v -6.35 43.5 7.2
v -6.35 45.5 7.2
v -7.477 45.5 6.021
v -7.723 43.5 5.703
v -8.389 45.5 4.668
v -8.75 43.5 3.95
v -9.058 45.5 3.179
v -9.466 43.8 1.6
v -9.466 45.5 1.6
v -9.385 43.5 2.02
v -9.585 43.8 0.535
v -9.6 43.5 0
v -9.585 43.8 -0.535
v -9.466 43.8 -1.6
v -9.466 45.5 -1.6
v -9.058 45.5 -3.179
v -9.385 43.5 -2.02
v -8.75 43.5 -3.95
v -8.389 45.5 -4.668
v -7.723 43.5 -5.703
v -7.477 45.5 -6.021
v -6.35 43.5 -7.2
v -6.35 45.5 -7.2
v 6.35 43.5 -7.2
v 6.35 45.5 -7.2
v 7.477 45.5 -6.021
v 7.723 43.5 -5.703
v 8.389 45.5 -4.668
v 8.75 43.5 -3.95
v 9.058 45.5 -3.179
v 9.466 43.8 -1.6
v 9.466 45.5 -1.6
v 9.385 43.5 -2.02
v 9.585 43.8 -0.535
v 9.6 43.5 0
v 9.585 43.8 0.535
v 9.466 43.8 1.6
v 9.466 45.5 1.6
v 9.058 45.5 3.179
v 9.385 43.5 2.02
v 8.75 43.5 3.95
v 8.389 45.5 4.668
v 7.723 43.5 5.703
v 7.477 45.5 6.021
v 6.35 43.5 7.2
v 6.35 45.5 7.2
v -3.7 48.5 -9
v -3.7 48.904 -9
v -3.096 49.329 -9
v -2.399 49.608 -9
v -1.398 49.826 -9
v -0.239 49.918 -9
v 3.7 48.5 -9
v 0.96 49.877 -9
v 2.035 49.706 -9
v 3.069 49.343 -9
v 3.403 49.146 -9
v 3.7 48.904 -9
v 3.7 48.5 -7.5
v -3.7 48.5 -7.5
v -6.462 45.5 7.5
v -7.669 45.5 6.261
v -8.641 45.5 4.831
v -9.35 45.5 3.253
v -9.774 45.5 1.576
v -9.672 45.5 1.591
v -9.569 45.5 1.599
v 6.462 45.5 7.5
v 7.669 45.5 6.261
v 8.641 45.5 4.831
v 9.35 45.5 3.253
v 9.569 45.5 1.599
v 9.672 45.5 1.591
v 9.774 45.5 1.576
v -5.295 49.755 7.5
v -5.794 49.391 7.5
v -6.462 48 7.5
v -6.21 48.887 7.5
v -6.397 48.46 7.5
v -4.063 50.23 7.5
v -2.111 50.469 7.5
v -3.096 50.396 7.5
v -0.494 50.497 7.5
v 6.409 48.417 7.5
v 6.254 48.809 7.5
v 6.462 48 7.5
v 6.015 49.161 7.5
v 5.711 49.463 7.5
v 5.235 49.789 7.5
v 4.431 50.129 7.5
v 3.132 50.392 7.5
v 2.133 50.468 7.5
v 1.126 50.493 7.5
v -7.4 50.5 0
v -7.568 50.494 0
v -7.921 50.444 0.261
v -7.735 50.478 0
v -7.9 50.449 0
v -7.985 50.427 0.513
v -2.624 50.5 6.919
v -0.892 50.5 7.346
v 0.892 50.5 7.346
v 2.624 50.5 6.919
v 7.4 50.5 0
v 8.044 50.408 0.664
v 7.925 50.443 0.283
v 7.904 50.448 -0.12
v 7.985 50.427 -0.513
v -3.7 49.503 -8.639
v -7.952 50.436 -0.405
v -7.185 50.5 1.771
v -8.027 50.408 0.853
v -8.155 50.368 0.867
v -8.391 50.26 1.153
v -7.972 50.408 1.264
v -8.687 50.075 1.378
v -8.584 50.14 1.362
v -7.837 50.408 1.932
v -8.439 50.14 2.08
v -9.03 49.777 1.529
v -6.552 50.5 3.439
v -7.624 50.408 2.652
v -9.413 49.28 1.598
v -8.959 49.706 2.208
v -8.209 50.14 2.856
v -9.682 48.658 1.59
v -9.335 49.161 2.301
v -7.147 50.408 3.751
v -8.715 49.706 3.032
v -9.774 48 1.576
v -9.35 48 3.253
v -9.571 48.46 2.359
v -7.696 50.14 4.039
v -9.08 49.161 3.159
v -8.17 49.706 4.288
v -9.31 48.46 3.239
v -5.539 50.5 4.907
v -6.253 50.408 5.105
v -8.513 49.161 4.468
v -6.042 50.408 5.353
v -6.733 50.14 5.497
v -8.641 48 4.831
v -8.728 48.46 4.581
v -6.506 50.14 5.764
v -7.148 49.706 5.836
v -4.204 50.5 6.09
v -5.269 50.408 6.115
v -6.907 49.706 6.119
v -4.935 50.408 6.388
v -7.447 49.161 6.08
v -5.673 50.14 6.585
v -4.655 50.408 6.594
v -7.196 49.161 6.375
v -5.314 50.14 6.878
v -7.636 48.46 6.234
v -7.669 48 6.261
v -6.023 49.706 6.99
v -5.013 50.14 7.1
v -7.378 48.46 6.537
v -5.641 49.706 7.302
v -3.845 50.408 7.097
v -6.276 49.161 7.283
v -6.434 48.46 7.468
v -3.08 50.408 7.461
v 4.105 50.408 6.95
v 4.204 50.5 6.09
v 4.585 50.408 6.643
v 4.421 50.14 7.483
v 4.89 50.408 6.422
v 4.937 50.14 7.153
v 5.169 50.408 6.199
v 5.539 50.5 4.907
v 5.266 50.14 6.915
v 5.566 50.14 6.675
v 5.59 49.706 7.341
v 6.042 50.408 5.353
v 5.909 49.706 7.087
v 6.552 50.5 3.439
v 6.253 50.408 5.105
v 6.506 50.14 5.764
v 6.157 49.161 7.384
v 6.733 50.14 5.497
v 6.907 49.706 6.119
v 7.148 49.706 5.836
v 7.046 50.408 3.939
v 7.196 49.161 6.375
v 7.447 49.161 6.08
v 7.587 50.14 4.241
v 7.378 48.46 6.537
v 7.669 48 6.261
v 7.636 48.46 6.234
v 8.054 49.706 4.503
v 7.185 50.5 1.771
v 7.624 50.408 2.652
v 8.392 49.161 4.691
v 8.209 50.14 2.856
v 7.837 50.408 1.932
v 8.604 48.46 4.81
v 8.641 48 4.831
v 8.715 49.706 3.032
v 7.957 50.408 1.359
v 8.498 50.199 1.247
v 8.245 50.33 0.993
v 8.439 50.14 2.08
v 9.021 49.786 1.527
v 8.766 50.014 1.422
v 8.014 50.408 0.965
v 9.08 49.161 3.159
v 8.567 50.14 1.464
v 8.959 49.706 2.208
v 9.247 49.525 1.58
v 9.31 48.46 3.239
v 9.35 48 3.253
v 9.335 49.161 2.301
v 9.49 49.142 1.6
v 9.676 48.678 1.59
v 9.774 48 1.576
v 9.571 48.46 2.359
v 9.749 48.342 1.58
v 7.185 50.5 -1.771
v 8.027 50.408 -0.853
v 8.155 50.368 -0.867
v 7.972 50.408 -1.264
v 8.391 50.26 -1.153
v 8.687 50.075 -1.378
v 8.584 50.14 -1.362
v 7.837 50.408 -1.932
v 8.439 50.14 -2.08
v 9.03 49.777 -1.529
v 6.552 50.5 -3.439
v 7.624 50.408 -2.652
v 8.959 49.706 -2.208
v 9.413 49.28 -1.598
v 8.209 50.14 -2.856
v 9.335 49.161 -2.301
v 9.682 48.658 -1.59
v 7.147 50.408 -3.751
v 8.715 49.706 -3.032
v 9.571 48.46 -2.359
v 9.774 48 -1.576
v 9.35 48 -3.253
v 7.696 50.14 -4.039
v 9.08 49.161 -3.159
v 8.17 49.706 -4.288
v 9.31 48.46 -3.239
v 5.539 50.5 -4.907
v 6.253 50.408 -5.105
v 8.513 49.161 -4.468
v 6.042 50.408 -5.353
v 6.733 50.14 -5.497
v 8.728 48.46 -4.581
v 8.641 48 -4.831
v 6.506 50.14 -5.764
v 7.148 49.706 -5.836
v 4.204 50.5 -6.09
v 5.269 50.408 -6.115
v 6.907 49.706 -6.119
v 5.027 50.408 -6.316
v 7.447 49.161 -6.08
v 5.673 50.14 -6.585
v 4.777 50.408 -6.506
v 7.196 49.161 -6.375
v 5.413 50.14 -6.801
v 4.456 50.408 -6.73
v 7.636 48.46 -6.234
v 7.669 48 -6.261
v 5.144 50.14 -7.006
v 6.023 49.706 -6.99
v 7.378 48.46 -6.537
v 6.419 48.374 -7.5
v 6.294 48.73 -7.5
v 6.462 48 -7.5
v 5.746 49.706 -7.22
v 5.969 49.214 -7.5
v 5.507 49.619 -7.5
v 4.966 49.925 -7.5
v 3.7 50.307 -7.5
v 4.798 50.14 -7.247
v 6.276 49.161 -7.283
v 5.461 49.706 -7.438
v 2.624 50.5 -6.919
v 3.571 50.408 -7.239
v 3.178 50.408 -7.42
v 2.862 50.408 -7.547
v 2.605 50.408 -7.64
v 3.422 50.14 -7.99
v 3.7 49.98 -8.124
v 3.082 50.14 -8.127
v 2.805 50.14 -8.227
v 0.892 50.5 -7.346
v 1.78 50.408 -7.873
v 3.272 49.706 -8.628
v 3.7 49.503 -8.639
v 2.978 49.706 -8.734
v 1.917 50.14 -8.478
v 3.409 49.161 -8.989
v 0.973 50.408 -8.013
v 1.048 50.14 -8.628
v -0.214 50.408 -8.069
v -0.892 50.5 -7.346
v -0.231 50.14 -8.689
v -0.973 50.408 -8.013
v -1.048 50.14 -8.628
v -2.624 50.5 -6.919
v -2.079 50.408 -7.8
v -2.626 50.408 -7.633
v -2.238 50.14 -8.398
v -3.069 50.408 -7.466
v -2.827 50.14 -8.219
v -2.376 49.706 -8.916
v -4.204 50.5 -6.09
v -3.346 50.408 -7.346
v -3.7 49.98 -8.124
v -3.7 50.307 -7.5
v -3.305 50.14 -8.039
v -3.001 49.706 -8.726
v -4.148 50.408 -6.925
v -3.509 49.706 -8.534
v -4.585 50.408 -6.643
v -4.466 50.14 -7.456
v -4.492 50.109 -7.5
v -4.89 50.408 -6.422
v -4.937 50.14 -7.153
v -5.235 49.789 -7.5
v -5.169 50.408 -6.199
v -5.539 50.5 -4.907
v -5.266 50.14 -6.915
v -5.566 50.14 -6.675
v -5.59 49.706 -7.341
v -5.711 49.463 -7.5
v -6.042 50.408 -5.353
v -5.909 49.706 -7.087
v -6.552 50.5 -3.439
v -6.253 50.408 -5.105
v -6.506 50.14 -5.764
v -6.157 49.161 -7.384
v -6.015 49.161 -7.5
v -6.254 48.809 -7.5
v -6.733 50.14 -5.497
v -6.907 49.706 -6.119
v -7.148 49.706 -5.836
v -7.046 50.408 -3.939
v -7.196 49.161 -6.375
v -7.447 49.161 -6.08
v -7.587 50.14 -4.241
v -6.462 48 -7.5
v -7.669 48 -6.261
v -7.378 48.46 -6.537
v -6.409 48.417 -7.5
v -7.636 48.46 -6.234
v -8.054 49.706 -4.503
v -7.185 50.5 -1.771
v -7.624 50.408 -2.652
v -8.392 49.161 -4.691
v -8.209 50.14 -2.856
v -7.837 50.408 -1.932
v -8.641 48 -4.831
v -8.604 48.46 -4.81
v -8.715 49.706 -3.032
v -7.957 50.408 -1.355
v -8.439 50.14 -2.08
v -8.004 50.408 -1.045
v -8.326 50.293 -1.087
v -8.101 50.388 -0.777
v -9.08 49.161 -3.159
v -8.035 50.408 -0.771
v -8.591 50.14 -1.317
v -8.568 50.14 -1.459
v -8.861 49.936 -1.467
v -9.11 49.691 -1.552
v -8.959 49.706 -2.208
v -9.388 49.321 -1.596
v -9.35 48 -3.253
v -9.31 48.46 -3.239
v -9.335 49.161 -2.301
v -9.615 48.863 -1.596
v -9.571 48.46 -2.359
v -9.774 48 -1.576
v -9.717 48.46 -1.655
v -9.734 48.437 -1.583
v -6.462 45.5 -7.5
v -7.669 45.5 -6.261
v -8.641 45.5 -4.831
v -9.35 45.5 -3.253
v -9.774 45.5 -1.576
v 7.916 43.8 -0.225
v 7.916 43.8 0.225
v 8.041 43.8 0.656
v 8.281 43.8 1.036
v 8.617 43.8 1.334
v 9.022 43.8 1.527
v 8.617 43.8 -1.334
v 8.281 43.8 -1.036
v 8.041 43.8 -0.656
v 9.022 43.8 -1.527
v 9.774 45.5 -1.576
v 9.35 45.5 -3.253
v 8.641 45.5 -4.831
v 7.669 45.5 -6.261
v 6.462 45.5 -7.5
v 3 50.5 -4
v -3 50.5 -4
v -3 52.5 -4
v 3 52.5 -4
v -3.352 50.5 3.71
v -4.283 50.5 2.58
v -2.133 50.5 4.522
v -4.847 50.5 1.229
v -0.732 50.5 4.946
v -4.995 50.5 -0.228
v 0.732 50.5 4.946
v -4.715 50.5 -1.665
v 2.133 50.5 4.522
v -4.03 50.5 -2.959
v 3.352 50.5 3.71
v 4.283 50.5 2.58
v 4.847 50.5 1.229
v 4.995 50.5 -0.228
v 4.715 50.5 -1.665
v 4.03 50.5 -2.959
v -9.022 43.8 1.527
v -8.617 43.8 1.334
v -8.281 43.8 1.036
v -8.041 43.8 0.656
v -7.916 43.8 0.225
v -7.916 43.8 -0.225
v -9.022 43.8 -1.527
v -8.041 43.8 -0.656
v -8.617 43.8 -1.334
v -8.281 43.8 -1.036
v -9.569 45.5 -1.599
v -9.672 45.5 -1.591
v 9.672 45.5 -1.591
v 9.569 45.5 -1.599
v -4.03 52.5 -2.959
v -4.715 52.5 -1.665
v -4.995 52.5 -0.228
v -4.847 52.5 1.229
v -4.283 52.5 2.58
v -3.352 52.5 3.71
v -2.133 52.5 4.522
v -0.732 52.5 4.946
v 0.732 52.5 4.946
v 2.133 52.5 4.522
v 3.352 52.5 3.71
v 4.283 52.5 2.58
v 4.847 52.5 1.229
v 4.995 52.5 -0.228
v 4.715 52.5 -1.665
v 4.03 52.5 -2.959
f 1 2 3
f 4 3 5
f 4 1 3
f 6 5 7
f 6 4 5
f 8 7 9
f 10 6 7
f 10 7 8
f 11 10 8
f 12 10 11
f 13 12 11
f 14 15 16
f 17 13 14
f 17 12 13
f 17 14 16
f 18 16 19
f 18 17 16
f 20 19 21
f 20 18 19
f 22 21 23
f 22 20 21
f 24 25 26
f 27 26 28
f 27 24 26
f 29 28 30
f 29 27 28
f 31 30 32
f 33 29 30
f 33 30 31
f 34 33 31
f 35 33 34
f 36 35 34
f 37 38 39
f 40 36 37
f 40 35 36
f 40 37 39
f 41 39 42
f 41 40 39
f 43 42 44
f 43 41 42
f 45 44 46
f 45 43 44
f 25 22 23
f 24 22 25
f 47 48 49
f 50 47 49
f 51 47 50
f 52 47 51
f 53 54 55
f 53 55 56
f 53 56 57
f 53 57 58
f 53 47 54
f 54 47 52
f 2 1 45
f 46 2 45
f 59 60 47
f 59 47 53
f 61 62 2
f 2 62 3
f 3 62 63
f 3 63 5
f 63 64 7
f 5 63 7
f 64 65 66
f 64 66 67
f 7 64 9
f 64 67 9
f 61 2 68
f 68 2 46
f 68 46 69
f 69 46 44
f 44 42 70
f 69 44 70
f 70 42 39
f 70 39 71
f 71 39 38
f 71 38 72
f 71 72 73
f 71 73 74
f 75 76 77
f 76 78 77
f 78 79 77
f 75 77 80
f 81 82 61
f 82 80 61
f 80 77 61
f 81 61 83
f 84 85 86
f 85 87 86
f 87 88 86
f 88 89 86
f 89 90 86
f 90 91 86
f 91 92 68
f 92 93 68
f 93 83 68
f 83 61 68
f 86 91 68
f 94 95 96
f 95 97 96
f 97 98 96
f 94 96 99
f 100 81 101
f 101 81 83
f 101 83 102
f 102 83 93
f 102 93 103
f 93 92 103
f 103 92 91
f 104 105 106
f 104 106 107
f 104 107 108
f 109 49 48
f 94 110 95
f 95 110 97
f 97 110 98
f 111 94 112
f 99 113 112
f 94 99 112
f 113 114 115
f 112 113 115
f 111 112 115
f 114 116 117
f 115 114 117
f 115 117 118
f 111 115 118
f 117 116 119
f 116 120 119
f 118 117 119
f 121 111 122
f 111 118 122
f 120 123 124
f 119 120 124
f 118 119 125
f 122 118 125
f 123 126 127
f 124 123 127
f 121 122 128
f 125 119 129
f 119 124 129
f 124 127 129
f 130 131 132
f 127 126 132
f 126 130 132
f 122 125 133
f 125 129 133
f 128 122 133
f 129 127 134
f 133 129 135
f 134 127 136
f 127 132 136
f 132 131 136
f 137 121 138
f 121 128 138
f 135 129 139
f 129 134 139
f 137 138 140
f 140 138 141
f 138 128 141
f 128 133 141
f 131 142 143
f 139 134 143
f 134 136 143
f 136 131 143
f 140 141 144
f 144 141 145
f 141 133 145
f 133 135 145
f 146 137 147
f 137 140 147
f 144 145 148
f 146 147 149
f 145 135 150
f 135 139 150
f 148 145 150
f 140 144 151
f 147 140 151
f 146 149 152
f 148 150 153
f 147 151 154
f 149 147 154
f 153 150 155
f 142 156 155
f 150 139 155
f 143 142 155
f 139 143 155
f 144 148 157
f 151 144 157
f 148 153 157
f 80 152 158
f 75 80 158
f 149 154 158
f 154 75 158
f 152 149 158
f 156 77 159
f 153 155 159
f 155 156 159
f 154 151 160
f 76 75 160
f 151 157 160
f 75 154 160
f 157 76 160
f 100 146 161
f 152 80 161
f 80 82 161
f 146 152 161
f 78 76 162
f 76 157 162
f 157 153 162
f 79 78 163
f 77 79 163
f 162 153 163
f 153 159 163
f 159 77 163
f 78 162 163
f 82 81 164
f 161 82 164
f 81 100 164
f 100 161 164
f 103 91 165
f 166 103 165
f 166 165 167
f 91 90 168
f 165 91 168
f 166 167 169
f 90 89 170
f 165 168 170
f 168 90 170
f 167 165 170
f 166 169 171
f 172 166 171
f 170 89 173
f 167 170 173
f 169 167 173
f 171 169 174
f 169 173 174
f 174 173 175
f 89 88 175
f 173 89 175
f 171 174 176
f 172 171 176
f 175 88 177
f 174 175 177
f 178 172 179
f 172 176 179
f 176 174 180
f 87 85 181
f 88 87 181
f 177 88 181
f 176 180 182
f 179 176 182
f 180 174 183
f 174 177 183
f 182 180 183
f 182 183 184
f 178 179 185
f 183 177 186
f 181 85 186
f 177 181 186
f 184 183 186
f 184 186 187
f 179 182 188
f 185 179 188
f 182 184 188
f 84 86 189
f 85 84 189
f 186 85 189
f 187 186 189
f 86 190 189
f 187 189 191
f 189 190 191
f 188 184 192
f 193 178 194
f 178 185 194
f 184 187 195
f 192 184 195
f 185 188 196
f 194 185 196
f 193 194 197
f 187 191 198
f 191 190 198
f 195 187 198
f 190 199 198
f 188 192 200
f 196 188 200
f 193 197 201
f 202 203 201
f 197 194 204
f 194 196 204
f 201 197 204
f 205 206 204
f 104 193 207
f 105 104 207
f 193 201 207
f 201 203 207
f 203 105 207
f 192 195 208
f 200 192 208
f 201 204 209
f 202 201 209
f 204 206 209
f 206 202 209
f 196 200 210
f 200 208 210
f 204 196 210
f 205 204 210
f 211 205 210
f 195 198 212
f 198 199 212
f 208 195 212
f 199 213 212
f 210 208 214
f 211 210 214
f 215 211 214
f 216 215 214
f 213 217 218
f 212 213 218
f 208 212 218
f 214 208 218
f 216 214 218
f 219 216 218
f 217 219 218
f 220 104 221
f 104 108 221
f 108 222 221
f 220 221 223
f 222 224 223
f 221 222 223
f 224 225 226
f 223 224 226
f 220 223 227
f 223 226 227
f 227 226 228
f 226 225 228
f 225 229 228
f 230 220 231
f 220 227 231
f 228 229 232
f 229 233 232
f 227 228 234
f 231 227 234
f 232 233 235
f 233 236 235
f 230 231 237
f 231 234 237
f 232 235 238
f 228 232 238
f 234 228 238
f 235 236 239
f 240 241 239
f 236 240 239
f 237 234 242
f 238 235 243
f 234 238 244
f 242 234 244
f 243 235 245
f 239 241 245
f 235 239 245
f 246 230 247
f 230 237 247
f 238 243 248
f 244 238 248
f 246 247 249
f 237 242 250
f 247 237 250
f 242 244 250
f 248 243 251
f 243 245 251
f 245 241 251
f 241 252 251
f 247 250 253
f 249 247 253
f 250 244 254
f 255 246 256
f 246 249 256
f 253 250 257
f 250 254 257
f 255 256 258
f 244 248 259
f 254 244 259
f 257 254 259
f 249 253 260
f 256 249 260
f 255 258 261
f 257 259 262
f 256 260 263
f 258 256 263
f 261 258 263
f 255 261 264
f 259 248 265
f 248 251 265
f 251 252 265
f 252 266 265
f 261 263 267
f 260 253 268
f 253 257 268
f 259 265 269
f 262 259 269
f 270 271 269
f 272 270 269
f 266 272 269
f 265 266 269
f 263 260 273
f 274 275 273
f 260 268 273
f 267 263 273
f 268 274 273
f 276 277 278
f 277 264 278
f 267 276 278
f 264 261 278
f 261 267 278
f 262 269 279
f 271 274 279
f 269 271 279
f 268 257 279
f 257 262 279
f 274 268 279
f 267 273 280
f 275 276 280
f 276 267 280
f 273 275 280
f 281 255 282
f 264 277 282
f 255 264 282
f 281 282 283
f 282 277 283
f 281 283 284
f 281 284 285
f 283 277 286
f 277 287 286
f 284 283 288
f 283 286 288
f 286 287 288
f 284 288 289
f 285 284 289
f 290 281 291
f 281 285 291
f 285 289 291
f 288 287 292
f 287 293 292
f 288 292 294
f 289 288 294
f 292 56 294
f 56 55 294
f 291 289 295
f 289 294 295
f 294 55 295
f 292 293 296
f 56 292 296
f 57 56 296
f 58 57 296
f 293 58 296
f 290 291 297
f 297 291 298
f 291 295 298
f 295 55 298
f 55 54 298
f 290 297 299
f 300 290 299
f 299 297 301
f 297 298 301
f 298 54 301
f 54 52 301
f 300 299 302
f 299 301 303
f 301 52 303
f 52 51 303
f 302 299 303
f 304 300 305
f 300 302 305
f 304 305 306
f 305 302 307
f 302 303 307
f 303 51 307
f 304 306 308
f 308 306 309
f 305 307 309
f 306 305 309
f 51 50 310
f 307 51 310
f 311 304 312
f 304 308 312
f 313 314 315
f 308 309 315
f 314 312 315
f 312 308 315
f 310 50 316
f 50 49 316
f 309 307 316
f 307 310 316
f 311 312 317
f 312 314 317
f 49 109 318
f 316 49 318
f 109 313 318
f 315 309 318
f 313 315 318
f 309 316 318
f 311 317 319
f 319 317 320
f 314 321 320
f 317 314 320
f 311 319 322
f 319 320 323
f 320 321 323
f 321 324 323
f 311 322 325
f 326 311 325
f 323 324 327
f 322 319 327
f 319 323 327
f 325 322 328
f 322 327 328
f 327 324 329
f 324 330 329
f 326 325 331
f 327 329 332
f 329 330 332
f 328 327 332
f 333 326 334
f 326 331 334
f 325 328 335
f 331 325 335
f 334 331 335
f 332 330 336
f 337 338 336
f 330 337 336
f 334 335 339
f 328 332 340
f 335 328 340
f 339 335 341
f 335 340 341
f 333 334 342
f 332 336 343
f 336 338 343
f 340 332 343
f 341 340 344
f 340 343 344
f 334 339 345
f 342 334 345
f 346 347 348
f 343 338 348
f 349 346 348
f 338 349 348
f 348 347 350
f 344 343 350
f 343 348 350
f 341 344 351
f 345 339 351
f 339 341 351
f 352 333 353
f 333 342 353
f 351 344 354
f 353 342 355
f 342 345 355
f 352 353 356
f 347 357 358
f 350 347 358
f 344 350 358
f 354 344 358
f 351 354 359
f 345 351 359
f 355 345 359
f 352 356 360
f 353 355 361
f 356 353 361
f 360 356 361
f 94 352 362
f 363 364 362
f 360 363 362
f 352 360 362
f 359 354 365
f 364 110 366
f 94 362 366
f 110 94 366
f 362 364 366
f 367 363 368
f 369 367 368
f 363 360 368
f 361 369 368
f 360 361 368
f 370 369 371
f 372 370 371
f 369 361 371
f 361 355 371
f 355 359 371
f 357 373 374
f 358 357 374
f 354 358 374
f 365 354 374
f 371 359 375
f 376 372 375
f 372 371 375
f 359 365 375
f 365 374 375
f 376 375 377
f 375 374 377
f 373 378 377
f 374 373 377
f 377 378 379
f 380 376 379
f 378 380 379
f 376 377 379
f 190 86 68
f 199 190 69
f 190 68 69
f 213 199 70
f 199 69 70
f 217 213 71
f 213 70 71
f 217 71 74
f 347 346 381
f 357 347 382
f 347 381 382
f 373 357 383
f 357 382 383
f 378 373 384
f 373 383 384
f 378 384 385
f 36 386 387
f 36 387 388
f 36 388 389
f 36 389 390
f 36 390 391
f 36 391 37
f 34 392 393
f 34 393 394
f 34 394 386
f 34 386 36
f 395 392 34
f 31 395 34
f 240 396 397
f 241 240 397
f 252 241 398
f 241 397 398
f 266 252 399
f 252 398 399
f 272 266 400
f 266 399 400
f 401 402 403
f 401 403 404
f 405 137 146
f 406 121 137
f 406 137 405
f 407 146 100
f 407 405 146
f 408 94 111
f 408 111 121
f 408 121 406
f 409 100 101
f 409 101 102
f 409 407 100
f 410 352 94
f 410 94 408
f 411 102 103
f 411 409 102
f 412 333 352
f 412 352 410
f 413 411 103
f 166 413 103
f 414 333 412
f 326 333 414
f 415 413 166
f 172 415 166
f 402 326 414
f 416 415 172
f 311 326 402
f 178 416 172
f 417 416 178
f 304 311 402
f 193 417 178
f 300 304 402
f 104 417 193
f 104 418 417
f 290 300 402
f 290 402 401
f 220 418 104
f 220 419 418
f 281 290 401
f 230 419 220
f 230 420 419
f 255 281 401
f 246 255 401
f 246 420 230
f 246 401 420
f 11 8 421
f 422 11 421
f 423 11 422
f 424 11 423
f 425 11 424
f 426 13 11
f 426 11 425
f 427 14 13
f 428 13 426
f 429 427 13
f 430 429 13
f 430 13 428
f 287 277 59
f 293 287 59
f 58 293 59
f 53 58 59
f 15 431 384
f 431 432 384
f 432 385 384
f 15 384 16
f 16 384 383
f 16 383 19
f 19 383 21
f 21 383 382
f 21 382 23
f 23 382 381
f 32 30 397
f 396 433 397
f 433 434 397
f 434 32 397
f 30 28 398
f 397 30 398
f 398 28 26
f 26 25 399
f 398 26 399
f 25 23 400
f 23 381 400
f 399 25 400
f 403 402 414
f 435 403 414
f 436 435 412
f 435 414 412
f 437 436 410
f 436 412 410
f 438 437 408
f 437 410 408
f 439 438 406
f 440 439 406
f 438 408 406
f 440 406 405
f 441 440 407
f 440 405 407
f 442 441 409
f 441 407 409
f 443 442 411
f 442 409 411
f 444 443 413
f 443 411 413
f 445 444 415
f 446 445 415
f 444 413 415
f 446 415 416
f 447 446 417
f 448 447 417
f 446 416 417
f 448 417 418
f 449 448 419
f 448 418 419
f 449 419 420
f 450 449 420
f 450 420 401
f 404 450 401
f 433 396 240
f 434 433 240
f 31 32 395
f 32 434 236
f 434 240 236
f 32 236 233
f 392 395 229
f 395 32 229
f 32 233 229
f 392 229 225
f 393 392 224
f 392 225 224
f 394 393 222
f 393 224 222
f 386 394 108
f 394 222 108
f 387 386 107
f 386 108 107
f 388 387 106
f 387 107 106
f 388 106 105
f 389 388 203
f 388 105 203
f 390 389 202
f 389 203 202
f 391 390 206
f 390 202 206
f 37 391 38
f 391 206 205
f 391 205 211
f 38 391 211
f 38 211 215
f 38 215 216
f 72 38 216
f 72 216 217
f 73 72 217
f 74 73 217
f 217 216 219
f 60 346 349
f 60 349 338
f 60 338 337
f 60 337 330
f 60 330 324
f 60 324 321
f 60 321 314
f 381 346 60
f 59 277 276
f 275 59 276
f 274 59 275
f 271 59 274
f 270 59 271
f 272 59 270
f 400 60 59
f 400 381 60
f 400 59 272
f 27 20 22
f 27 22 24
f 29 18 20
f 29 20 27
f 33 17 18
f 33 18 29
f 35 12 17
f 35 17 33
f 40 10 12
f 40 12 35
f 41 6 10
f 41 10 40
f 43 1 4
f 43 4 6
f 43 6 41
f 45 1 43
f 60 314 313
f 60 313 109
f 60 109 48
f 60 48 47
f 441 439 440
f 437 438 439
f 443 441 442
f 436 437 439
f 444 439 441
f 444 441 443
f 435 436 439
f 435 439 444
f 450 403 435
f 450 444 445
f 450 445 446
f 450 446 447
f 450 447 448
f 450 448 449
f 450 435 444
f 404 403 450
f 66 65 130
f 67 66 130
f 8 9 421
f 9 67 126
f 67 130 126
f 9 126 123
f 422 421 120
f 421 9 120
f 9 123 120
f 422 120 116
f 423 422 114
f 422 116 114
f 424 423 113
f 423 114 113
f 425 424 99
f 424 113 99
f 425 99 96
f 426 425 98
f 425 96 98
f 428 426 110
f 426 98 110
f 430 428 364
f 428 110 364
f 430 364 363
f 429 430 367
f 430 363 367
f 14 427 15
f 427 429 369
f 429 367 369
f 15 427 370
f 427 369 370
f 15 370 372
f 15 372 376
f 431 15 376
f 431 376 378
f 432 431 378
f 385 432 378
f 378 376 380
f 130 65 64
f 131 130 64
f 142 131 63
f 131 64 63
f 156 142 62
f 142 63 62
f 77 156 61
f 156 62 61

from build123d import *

# Parameters (mm, degrees)
PAD037_DEPTH    = 2
PAD043_DEPTH    = 5
PAD018_DEPTH    = 2
SKETCH069_R     = 1.6
POCKET020_DEPTH = 6.7
SKETCH071_W     = 7.4
SKETCH071_H     = 2
PAD045_DEPTH    = 1.5


with BuildPart() as part:
    # Sketch051 → Pad037 (new body)
    with BuildSketch(Plane.XZ.offset(-17.8)):
        with BuildLine():
            ThreePointArc((-6.3498031466, 7.2), (-9.6, 0), (-6.3498031466, -7.2))
            Line((-6.3498031466, -7.2), (6.3498031466, -7.2))
            ThreePointArc((6.3498031466, -7.2), (9.6, 0), (6.3498031466, 7.2))
            Line((-6.3498031466, 7.2), (6.3498031466, 7.2))
        make_face()
    extrude(amount=-PAD037_DEPTH)

    # Sketch067 (on Face6 of Pad037) → Pad043 (join)
    with BuildSketch(Plane(origin=(0, 19.8, 0), x_dir=(1, 0, 0), z_dir=(0, 1, 0))):
        with BuildLine():
            ThreePointArc((-6.4621977686, 7.5), (-9.9, 0), (-6.4621977686, -7.5))
            Line((-6.4621977686, -7.5), (6.4621977686, -7.5))
            ThreePointArc((6.4621977686, -7.5), (9.9, 0), (6.4621977686, 7.5))
            Line((-6.4621977686, 7.5), (6.4621977686, 7.5))
        make_face()
    extrude(amount=PAD043_DEPTH)

    # Sketch068 (on Face5 of Pad043) → Pad018 (join)
    with BuildSketch(Plane(origin=(0, 24.8, 0), x_dir=(1, 0, 0), z_dir=(0, 1, 0))):
        with BuildLine():
            ThreePointArc((-3, 4), (0, -5), (3, 4))
            Line((-3, 4), (3, 4))
        make_face()
    extrude(amount=PAD018_DEPTH)

    # Sketch069 (on Face5 of Pad018) → Pocket020 (cut)
    with BuildSketch(Plane(origin=(0, 24.8, 0), x_dir=(1, 0, 0), z_dir=(0, 1, 0))):
        with Locations((-9.5, 0)):
            Circle(SKETCH069_R)
        with Locations((9.5, 0)):
            Circle(SKETCH069_R)
    extrude(amount=-POCKET020_DEPTH, mode=Mode.SUBTRACT)

    # Sketch071 (on Face4 of Pocket020) → Pad045 (join)
    with BuildSketch(Plane(origin=(0, 0, -7.5), x_dir=(1, 0, 0), z_dir=(0, 0, -1))):
        with Locations((0, -23.8)):
            Rectangle(SKETCH071_W, SKETCH071_H)
    extrude(amount=PAD045_DEPTH)

    # Sketch072 → Groove (revolve, cut)
    with BuildSketch(Plane.XY):
        with BuildLine():
            ThreePointArc((-7.4, 24.8), (-9.167766953, 24.067766953), (-9.9, 22.3))
            Line((-9.9, 24.8), (-9.9, 22.3))
            Line((-9.9, 24.8), (-7.4, 24.8))
        make_face()
    revolve(axis=Axis((0, 0, 0), (0, 1, 0)), mode=Mode.SUBTRACT)


with BuildPart() as part_1:
    # Body023 placement: moved
    add(part.part.moved(Location((0, 25.7, 0))))


solid = part_1.part
